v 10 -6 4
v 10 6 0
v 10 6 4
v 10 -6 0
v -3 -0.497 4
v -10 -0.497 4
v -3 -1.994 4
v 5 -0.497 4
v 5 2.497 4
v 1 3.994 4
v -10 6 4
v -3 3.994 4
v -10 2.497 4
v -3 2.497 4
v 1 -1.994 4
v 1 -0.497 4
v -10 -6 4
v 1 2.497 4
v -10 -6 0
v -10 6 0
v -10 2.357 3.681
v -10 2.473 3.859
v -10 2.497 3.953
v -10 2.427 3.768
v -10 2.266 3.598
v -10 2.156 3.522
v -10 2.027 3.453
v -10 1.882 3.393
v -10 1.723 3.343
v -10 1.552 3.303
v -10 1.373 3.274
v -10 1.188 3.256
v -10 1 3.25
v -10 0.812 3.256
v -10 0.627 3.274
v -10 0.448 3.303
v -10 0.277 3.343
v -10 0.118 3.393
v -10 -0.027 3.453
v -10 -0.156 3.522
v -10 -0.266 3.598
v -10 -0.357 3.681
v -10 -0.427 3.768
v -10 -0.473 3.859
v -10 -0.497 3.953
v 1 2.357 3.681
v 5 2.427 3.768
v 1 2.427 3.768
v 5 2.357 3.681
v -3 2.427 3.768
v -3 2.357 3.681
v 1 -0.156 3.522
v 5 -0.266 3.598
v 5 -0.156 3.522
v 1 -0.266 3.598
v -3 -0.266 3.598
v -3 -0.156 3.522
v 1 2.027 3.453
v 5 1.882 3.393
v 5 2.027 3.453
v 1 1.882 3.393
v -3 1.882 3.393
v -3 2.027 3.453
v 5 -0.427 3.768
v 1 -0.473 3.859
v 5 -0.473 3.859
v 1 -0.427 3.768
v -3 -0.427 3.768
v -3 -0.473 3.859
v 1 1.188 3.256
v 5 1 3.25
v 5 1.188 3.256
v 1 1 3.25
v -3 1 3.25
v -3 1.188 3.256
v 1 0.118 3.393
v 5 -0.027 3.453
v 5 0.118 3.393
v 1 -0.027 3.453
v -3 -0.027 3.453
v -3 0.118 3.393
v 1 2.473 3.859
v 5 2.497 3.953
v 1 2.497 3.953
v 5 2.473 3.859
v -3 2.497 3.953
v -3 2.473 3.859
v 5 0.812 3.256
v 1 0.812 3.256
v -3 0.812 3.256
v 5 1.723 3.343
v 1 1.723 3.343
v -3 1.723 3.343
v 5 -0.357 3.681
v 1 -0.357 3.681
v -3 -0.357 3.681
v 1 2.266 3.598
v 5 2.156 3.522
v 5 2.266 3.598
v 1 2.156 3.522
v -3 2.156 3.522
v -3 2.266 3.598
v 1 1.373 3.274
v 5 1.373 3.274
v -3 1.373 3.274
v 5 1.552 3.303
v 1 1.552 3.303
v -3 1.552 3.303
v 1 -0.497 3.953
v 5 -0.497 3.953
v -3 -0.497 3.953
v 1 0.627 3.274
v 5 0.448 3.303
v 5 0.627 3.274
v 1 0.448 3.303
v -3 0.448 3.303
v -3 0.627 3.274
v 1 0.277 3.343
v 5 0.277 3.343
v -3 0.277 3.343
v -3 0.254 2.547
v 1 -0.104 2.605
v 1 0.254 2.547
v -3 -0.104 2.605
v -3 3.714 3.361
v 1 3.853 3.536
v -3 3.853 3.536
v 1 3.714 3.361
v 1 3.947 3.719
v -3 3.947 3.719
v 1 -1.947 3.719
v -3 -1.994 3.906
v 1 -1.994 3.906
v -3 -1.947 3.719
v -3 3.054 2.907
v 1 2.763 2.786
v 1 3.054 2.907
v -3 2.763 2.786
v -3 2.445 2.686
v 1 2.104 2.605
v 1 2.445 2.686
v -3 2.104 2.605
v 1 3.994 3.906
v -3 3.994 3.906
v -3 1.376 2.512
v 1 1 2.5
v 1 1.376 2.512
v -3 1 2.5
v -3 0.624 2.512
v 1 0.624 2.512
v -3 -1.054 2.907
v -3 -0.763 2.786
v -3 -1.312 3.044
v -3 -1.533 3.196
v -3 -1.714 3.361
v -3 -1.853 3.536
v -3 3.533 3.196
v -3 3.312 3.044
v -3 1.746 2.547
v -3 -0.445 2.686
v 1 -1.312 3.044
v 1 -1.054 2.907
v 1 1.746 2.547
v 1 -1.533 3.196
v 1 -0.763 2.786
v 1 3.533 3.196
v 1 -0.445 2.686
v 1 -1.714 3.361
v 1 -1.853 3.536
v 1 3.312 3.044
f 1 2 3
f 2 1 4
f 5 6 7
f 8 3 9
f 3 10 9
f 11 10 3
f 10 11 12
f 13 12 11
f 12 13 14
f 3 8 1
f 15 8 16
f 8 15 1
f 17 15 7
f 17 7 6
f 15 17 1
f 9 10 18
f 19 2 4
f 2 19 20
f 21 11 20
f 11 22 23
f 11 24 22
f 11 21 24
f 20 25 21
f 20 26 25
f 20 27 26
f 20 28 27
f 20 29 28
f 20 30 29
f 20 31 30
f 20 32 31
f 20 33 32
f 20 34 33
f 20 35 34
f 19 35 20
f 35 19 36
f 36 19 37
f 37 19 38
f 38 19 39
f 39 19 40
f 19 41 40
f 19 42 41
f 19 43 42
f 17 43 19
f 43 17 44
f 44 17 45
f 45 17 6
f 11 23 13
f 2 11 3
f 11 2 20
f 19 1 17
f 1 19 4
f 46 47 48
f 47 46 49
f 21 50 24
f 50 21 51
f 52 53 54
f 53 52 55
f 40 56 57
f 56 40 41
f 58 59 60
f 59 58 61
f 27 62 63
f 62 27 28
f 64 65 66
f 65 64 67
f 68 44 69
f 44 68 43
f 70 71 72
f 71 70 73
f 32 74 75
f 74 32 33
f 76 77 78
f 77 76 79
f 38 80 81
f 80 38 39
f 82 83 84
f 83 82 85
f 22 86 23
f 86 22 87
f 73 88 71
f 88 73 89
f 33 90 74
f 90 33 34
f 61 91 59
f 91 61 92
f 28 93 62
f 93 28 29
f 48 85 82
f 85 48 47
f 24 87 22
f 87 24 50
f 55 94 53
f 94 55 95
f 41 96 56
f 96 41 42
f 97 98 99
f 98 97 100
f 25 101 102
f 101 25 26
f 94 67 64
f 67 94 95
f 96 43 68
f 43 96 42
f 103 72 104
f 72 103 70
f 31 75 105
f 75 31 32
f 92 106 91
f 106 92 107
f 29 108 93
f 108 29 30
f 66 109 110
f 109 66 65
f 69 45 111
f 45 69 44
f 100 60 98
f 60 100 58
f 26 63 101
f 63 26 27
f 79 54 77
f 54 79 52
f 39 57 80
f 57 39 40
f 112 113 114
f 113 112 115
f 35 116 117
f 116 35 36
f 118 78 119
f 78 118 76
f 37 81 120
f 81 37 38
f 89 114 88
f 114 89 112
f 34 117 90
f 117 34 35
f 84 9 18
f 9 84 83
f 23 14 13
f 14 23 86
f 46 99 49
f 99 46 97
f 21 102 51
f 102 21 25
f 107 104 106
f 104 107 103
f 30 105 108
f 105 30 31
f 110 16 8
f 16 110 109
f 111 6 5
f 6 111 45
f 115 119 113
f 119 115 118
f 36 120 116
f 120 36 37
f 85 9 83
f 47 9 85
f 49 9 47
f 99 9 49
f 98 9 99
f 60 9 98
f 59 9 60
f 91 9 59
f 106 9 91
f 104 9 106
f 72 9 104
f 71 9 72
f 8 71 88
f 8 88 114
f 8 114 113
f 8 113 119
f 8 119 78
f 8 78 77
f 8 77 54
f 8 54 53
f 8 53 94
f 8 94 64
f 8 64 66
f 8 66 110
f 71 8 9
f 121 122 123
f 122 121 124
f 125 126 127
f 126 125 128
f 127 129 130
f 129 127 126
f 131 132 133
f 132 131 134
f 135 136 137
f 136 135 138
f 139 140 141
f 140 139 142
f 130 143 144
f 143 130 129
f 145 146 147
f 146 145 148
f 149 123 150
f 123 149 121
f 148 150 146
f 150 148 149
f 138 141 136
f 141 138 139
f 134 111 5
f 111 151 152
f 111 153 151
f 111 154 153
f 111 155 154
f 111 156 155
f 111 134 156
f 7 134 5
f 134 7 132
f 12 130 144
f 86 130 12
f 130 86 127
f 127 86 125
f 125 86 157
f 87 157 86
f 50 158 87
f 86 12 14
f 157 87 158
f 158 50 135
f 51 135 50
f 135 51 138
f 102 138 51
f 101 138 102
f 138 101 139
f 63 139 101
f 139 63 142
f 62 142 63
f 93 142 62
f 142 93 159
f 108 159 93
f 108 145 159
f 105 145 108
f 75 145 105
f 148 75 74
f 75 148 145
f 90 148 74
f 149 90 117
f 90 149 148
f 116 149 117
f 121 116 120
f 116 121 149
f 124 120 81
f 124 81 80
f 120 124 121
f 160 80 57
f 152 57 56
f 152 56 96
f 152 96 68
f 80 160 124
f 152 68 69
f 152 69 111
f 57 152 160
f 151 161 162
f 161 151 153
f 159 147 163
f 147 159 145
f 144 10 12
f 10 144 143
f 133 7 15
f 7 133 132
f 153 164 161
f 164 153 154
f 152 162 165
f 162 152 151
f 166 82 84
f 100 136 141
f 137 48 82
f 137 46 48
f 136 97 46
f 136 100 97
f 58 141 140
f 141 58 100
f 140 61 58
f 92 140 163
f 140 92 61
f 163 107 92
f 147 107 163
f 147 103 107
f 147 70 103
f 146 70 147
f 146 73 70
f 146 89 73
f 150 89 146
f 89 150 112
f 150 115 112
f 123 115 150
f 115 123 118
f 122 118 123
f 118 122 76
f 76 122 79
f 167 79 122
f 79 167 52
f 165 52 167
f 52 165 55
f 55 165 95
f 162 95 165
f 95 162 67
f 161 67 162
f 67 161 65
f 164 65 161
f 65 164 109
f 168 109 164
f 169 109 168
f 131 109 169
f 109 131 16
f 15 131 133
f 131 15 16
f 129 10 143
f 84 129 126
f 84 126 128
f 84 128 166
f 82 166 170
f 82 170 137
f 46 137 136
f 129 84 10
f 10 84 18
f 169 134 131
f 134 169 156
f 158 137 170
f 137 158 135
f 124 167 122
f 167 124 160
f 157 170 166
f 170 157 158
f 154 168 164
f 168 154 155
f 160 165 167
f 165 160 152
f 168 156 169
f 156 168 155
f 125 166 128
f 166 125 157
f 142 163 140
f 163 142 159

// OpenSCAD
CUBE_X = 20;
CUBE_Y = 12;
CUBE_Z = 4;

EDGE_OFFSET = 5;

SQUISH = 0.5;
DETAIL = 50;

// Uncomment only one of the following lines to get
// braces for each of the four corners:

//scale(v = [-1, -1, 1])
//scale(v = [1, -1, 1])
//scale(v = [-1, 1, 1])
scale(v = [1, 1, 1])

    translate(v = [CUBE_X / -2, CUBE_Y / -2, 0])
        difference()
        {
            cube(size = [CUBE_X, CUBE_Y, CUBE_Z]);
            translate(v = [-1, CUBE_Y - EDGE_OFFSET, CUBE_Z])
                scale(v = [1, 1, SQUISH])
                    rotate(a = [0, 90, 0])
                        cylinder(h = 15 + 1, r = 1.5, $fn = DETAIL);
            translate(v = [7, CUBE_Y - EDGE_OFFSET, CUBE_Z])
                scale(v = [1, 1, SQUISH])
                    rotate(a = [0, 90, 0])
                        cylinder(h = 4, r = 3, $fn = DETAIL);
        }
